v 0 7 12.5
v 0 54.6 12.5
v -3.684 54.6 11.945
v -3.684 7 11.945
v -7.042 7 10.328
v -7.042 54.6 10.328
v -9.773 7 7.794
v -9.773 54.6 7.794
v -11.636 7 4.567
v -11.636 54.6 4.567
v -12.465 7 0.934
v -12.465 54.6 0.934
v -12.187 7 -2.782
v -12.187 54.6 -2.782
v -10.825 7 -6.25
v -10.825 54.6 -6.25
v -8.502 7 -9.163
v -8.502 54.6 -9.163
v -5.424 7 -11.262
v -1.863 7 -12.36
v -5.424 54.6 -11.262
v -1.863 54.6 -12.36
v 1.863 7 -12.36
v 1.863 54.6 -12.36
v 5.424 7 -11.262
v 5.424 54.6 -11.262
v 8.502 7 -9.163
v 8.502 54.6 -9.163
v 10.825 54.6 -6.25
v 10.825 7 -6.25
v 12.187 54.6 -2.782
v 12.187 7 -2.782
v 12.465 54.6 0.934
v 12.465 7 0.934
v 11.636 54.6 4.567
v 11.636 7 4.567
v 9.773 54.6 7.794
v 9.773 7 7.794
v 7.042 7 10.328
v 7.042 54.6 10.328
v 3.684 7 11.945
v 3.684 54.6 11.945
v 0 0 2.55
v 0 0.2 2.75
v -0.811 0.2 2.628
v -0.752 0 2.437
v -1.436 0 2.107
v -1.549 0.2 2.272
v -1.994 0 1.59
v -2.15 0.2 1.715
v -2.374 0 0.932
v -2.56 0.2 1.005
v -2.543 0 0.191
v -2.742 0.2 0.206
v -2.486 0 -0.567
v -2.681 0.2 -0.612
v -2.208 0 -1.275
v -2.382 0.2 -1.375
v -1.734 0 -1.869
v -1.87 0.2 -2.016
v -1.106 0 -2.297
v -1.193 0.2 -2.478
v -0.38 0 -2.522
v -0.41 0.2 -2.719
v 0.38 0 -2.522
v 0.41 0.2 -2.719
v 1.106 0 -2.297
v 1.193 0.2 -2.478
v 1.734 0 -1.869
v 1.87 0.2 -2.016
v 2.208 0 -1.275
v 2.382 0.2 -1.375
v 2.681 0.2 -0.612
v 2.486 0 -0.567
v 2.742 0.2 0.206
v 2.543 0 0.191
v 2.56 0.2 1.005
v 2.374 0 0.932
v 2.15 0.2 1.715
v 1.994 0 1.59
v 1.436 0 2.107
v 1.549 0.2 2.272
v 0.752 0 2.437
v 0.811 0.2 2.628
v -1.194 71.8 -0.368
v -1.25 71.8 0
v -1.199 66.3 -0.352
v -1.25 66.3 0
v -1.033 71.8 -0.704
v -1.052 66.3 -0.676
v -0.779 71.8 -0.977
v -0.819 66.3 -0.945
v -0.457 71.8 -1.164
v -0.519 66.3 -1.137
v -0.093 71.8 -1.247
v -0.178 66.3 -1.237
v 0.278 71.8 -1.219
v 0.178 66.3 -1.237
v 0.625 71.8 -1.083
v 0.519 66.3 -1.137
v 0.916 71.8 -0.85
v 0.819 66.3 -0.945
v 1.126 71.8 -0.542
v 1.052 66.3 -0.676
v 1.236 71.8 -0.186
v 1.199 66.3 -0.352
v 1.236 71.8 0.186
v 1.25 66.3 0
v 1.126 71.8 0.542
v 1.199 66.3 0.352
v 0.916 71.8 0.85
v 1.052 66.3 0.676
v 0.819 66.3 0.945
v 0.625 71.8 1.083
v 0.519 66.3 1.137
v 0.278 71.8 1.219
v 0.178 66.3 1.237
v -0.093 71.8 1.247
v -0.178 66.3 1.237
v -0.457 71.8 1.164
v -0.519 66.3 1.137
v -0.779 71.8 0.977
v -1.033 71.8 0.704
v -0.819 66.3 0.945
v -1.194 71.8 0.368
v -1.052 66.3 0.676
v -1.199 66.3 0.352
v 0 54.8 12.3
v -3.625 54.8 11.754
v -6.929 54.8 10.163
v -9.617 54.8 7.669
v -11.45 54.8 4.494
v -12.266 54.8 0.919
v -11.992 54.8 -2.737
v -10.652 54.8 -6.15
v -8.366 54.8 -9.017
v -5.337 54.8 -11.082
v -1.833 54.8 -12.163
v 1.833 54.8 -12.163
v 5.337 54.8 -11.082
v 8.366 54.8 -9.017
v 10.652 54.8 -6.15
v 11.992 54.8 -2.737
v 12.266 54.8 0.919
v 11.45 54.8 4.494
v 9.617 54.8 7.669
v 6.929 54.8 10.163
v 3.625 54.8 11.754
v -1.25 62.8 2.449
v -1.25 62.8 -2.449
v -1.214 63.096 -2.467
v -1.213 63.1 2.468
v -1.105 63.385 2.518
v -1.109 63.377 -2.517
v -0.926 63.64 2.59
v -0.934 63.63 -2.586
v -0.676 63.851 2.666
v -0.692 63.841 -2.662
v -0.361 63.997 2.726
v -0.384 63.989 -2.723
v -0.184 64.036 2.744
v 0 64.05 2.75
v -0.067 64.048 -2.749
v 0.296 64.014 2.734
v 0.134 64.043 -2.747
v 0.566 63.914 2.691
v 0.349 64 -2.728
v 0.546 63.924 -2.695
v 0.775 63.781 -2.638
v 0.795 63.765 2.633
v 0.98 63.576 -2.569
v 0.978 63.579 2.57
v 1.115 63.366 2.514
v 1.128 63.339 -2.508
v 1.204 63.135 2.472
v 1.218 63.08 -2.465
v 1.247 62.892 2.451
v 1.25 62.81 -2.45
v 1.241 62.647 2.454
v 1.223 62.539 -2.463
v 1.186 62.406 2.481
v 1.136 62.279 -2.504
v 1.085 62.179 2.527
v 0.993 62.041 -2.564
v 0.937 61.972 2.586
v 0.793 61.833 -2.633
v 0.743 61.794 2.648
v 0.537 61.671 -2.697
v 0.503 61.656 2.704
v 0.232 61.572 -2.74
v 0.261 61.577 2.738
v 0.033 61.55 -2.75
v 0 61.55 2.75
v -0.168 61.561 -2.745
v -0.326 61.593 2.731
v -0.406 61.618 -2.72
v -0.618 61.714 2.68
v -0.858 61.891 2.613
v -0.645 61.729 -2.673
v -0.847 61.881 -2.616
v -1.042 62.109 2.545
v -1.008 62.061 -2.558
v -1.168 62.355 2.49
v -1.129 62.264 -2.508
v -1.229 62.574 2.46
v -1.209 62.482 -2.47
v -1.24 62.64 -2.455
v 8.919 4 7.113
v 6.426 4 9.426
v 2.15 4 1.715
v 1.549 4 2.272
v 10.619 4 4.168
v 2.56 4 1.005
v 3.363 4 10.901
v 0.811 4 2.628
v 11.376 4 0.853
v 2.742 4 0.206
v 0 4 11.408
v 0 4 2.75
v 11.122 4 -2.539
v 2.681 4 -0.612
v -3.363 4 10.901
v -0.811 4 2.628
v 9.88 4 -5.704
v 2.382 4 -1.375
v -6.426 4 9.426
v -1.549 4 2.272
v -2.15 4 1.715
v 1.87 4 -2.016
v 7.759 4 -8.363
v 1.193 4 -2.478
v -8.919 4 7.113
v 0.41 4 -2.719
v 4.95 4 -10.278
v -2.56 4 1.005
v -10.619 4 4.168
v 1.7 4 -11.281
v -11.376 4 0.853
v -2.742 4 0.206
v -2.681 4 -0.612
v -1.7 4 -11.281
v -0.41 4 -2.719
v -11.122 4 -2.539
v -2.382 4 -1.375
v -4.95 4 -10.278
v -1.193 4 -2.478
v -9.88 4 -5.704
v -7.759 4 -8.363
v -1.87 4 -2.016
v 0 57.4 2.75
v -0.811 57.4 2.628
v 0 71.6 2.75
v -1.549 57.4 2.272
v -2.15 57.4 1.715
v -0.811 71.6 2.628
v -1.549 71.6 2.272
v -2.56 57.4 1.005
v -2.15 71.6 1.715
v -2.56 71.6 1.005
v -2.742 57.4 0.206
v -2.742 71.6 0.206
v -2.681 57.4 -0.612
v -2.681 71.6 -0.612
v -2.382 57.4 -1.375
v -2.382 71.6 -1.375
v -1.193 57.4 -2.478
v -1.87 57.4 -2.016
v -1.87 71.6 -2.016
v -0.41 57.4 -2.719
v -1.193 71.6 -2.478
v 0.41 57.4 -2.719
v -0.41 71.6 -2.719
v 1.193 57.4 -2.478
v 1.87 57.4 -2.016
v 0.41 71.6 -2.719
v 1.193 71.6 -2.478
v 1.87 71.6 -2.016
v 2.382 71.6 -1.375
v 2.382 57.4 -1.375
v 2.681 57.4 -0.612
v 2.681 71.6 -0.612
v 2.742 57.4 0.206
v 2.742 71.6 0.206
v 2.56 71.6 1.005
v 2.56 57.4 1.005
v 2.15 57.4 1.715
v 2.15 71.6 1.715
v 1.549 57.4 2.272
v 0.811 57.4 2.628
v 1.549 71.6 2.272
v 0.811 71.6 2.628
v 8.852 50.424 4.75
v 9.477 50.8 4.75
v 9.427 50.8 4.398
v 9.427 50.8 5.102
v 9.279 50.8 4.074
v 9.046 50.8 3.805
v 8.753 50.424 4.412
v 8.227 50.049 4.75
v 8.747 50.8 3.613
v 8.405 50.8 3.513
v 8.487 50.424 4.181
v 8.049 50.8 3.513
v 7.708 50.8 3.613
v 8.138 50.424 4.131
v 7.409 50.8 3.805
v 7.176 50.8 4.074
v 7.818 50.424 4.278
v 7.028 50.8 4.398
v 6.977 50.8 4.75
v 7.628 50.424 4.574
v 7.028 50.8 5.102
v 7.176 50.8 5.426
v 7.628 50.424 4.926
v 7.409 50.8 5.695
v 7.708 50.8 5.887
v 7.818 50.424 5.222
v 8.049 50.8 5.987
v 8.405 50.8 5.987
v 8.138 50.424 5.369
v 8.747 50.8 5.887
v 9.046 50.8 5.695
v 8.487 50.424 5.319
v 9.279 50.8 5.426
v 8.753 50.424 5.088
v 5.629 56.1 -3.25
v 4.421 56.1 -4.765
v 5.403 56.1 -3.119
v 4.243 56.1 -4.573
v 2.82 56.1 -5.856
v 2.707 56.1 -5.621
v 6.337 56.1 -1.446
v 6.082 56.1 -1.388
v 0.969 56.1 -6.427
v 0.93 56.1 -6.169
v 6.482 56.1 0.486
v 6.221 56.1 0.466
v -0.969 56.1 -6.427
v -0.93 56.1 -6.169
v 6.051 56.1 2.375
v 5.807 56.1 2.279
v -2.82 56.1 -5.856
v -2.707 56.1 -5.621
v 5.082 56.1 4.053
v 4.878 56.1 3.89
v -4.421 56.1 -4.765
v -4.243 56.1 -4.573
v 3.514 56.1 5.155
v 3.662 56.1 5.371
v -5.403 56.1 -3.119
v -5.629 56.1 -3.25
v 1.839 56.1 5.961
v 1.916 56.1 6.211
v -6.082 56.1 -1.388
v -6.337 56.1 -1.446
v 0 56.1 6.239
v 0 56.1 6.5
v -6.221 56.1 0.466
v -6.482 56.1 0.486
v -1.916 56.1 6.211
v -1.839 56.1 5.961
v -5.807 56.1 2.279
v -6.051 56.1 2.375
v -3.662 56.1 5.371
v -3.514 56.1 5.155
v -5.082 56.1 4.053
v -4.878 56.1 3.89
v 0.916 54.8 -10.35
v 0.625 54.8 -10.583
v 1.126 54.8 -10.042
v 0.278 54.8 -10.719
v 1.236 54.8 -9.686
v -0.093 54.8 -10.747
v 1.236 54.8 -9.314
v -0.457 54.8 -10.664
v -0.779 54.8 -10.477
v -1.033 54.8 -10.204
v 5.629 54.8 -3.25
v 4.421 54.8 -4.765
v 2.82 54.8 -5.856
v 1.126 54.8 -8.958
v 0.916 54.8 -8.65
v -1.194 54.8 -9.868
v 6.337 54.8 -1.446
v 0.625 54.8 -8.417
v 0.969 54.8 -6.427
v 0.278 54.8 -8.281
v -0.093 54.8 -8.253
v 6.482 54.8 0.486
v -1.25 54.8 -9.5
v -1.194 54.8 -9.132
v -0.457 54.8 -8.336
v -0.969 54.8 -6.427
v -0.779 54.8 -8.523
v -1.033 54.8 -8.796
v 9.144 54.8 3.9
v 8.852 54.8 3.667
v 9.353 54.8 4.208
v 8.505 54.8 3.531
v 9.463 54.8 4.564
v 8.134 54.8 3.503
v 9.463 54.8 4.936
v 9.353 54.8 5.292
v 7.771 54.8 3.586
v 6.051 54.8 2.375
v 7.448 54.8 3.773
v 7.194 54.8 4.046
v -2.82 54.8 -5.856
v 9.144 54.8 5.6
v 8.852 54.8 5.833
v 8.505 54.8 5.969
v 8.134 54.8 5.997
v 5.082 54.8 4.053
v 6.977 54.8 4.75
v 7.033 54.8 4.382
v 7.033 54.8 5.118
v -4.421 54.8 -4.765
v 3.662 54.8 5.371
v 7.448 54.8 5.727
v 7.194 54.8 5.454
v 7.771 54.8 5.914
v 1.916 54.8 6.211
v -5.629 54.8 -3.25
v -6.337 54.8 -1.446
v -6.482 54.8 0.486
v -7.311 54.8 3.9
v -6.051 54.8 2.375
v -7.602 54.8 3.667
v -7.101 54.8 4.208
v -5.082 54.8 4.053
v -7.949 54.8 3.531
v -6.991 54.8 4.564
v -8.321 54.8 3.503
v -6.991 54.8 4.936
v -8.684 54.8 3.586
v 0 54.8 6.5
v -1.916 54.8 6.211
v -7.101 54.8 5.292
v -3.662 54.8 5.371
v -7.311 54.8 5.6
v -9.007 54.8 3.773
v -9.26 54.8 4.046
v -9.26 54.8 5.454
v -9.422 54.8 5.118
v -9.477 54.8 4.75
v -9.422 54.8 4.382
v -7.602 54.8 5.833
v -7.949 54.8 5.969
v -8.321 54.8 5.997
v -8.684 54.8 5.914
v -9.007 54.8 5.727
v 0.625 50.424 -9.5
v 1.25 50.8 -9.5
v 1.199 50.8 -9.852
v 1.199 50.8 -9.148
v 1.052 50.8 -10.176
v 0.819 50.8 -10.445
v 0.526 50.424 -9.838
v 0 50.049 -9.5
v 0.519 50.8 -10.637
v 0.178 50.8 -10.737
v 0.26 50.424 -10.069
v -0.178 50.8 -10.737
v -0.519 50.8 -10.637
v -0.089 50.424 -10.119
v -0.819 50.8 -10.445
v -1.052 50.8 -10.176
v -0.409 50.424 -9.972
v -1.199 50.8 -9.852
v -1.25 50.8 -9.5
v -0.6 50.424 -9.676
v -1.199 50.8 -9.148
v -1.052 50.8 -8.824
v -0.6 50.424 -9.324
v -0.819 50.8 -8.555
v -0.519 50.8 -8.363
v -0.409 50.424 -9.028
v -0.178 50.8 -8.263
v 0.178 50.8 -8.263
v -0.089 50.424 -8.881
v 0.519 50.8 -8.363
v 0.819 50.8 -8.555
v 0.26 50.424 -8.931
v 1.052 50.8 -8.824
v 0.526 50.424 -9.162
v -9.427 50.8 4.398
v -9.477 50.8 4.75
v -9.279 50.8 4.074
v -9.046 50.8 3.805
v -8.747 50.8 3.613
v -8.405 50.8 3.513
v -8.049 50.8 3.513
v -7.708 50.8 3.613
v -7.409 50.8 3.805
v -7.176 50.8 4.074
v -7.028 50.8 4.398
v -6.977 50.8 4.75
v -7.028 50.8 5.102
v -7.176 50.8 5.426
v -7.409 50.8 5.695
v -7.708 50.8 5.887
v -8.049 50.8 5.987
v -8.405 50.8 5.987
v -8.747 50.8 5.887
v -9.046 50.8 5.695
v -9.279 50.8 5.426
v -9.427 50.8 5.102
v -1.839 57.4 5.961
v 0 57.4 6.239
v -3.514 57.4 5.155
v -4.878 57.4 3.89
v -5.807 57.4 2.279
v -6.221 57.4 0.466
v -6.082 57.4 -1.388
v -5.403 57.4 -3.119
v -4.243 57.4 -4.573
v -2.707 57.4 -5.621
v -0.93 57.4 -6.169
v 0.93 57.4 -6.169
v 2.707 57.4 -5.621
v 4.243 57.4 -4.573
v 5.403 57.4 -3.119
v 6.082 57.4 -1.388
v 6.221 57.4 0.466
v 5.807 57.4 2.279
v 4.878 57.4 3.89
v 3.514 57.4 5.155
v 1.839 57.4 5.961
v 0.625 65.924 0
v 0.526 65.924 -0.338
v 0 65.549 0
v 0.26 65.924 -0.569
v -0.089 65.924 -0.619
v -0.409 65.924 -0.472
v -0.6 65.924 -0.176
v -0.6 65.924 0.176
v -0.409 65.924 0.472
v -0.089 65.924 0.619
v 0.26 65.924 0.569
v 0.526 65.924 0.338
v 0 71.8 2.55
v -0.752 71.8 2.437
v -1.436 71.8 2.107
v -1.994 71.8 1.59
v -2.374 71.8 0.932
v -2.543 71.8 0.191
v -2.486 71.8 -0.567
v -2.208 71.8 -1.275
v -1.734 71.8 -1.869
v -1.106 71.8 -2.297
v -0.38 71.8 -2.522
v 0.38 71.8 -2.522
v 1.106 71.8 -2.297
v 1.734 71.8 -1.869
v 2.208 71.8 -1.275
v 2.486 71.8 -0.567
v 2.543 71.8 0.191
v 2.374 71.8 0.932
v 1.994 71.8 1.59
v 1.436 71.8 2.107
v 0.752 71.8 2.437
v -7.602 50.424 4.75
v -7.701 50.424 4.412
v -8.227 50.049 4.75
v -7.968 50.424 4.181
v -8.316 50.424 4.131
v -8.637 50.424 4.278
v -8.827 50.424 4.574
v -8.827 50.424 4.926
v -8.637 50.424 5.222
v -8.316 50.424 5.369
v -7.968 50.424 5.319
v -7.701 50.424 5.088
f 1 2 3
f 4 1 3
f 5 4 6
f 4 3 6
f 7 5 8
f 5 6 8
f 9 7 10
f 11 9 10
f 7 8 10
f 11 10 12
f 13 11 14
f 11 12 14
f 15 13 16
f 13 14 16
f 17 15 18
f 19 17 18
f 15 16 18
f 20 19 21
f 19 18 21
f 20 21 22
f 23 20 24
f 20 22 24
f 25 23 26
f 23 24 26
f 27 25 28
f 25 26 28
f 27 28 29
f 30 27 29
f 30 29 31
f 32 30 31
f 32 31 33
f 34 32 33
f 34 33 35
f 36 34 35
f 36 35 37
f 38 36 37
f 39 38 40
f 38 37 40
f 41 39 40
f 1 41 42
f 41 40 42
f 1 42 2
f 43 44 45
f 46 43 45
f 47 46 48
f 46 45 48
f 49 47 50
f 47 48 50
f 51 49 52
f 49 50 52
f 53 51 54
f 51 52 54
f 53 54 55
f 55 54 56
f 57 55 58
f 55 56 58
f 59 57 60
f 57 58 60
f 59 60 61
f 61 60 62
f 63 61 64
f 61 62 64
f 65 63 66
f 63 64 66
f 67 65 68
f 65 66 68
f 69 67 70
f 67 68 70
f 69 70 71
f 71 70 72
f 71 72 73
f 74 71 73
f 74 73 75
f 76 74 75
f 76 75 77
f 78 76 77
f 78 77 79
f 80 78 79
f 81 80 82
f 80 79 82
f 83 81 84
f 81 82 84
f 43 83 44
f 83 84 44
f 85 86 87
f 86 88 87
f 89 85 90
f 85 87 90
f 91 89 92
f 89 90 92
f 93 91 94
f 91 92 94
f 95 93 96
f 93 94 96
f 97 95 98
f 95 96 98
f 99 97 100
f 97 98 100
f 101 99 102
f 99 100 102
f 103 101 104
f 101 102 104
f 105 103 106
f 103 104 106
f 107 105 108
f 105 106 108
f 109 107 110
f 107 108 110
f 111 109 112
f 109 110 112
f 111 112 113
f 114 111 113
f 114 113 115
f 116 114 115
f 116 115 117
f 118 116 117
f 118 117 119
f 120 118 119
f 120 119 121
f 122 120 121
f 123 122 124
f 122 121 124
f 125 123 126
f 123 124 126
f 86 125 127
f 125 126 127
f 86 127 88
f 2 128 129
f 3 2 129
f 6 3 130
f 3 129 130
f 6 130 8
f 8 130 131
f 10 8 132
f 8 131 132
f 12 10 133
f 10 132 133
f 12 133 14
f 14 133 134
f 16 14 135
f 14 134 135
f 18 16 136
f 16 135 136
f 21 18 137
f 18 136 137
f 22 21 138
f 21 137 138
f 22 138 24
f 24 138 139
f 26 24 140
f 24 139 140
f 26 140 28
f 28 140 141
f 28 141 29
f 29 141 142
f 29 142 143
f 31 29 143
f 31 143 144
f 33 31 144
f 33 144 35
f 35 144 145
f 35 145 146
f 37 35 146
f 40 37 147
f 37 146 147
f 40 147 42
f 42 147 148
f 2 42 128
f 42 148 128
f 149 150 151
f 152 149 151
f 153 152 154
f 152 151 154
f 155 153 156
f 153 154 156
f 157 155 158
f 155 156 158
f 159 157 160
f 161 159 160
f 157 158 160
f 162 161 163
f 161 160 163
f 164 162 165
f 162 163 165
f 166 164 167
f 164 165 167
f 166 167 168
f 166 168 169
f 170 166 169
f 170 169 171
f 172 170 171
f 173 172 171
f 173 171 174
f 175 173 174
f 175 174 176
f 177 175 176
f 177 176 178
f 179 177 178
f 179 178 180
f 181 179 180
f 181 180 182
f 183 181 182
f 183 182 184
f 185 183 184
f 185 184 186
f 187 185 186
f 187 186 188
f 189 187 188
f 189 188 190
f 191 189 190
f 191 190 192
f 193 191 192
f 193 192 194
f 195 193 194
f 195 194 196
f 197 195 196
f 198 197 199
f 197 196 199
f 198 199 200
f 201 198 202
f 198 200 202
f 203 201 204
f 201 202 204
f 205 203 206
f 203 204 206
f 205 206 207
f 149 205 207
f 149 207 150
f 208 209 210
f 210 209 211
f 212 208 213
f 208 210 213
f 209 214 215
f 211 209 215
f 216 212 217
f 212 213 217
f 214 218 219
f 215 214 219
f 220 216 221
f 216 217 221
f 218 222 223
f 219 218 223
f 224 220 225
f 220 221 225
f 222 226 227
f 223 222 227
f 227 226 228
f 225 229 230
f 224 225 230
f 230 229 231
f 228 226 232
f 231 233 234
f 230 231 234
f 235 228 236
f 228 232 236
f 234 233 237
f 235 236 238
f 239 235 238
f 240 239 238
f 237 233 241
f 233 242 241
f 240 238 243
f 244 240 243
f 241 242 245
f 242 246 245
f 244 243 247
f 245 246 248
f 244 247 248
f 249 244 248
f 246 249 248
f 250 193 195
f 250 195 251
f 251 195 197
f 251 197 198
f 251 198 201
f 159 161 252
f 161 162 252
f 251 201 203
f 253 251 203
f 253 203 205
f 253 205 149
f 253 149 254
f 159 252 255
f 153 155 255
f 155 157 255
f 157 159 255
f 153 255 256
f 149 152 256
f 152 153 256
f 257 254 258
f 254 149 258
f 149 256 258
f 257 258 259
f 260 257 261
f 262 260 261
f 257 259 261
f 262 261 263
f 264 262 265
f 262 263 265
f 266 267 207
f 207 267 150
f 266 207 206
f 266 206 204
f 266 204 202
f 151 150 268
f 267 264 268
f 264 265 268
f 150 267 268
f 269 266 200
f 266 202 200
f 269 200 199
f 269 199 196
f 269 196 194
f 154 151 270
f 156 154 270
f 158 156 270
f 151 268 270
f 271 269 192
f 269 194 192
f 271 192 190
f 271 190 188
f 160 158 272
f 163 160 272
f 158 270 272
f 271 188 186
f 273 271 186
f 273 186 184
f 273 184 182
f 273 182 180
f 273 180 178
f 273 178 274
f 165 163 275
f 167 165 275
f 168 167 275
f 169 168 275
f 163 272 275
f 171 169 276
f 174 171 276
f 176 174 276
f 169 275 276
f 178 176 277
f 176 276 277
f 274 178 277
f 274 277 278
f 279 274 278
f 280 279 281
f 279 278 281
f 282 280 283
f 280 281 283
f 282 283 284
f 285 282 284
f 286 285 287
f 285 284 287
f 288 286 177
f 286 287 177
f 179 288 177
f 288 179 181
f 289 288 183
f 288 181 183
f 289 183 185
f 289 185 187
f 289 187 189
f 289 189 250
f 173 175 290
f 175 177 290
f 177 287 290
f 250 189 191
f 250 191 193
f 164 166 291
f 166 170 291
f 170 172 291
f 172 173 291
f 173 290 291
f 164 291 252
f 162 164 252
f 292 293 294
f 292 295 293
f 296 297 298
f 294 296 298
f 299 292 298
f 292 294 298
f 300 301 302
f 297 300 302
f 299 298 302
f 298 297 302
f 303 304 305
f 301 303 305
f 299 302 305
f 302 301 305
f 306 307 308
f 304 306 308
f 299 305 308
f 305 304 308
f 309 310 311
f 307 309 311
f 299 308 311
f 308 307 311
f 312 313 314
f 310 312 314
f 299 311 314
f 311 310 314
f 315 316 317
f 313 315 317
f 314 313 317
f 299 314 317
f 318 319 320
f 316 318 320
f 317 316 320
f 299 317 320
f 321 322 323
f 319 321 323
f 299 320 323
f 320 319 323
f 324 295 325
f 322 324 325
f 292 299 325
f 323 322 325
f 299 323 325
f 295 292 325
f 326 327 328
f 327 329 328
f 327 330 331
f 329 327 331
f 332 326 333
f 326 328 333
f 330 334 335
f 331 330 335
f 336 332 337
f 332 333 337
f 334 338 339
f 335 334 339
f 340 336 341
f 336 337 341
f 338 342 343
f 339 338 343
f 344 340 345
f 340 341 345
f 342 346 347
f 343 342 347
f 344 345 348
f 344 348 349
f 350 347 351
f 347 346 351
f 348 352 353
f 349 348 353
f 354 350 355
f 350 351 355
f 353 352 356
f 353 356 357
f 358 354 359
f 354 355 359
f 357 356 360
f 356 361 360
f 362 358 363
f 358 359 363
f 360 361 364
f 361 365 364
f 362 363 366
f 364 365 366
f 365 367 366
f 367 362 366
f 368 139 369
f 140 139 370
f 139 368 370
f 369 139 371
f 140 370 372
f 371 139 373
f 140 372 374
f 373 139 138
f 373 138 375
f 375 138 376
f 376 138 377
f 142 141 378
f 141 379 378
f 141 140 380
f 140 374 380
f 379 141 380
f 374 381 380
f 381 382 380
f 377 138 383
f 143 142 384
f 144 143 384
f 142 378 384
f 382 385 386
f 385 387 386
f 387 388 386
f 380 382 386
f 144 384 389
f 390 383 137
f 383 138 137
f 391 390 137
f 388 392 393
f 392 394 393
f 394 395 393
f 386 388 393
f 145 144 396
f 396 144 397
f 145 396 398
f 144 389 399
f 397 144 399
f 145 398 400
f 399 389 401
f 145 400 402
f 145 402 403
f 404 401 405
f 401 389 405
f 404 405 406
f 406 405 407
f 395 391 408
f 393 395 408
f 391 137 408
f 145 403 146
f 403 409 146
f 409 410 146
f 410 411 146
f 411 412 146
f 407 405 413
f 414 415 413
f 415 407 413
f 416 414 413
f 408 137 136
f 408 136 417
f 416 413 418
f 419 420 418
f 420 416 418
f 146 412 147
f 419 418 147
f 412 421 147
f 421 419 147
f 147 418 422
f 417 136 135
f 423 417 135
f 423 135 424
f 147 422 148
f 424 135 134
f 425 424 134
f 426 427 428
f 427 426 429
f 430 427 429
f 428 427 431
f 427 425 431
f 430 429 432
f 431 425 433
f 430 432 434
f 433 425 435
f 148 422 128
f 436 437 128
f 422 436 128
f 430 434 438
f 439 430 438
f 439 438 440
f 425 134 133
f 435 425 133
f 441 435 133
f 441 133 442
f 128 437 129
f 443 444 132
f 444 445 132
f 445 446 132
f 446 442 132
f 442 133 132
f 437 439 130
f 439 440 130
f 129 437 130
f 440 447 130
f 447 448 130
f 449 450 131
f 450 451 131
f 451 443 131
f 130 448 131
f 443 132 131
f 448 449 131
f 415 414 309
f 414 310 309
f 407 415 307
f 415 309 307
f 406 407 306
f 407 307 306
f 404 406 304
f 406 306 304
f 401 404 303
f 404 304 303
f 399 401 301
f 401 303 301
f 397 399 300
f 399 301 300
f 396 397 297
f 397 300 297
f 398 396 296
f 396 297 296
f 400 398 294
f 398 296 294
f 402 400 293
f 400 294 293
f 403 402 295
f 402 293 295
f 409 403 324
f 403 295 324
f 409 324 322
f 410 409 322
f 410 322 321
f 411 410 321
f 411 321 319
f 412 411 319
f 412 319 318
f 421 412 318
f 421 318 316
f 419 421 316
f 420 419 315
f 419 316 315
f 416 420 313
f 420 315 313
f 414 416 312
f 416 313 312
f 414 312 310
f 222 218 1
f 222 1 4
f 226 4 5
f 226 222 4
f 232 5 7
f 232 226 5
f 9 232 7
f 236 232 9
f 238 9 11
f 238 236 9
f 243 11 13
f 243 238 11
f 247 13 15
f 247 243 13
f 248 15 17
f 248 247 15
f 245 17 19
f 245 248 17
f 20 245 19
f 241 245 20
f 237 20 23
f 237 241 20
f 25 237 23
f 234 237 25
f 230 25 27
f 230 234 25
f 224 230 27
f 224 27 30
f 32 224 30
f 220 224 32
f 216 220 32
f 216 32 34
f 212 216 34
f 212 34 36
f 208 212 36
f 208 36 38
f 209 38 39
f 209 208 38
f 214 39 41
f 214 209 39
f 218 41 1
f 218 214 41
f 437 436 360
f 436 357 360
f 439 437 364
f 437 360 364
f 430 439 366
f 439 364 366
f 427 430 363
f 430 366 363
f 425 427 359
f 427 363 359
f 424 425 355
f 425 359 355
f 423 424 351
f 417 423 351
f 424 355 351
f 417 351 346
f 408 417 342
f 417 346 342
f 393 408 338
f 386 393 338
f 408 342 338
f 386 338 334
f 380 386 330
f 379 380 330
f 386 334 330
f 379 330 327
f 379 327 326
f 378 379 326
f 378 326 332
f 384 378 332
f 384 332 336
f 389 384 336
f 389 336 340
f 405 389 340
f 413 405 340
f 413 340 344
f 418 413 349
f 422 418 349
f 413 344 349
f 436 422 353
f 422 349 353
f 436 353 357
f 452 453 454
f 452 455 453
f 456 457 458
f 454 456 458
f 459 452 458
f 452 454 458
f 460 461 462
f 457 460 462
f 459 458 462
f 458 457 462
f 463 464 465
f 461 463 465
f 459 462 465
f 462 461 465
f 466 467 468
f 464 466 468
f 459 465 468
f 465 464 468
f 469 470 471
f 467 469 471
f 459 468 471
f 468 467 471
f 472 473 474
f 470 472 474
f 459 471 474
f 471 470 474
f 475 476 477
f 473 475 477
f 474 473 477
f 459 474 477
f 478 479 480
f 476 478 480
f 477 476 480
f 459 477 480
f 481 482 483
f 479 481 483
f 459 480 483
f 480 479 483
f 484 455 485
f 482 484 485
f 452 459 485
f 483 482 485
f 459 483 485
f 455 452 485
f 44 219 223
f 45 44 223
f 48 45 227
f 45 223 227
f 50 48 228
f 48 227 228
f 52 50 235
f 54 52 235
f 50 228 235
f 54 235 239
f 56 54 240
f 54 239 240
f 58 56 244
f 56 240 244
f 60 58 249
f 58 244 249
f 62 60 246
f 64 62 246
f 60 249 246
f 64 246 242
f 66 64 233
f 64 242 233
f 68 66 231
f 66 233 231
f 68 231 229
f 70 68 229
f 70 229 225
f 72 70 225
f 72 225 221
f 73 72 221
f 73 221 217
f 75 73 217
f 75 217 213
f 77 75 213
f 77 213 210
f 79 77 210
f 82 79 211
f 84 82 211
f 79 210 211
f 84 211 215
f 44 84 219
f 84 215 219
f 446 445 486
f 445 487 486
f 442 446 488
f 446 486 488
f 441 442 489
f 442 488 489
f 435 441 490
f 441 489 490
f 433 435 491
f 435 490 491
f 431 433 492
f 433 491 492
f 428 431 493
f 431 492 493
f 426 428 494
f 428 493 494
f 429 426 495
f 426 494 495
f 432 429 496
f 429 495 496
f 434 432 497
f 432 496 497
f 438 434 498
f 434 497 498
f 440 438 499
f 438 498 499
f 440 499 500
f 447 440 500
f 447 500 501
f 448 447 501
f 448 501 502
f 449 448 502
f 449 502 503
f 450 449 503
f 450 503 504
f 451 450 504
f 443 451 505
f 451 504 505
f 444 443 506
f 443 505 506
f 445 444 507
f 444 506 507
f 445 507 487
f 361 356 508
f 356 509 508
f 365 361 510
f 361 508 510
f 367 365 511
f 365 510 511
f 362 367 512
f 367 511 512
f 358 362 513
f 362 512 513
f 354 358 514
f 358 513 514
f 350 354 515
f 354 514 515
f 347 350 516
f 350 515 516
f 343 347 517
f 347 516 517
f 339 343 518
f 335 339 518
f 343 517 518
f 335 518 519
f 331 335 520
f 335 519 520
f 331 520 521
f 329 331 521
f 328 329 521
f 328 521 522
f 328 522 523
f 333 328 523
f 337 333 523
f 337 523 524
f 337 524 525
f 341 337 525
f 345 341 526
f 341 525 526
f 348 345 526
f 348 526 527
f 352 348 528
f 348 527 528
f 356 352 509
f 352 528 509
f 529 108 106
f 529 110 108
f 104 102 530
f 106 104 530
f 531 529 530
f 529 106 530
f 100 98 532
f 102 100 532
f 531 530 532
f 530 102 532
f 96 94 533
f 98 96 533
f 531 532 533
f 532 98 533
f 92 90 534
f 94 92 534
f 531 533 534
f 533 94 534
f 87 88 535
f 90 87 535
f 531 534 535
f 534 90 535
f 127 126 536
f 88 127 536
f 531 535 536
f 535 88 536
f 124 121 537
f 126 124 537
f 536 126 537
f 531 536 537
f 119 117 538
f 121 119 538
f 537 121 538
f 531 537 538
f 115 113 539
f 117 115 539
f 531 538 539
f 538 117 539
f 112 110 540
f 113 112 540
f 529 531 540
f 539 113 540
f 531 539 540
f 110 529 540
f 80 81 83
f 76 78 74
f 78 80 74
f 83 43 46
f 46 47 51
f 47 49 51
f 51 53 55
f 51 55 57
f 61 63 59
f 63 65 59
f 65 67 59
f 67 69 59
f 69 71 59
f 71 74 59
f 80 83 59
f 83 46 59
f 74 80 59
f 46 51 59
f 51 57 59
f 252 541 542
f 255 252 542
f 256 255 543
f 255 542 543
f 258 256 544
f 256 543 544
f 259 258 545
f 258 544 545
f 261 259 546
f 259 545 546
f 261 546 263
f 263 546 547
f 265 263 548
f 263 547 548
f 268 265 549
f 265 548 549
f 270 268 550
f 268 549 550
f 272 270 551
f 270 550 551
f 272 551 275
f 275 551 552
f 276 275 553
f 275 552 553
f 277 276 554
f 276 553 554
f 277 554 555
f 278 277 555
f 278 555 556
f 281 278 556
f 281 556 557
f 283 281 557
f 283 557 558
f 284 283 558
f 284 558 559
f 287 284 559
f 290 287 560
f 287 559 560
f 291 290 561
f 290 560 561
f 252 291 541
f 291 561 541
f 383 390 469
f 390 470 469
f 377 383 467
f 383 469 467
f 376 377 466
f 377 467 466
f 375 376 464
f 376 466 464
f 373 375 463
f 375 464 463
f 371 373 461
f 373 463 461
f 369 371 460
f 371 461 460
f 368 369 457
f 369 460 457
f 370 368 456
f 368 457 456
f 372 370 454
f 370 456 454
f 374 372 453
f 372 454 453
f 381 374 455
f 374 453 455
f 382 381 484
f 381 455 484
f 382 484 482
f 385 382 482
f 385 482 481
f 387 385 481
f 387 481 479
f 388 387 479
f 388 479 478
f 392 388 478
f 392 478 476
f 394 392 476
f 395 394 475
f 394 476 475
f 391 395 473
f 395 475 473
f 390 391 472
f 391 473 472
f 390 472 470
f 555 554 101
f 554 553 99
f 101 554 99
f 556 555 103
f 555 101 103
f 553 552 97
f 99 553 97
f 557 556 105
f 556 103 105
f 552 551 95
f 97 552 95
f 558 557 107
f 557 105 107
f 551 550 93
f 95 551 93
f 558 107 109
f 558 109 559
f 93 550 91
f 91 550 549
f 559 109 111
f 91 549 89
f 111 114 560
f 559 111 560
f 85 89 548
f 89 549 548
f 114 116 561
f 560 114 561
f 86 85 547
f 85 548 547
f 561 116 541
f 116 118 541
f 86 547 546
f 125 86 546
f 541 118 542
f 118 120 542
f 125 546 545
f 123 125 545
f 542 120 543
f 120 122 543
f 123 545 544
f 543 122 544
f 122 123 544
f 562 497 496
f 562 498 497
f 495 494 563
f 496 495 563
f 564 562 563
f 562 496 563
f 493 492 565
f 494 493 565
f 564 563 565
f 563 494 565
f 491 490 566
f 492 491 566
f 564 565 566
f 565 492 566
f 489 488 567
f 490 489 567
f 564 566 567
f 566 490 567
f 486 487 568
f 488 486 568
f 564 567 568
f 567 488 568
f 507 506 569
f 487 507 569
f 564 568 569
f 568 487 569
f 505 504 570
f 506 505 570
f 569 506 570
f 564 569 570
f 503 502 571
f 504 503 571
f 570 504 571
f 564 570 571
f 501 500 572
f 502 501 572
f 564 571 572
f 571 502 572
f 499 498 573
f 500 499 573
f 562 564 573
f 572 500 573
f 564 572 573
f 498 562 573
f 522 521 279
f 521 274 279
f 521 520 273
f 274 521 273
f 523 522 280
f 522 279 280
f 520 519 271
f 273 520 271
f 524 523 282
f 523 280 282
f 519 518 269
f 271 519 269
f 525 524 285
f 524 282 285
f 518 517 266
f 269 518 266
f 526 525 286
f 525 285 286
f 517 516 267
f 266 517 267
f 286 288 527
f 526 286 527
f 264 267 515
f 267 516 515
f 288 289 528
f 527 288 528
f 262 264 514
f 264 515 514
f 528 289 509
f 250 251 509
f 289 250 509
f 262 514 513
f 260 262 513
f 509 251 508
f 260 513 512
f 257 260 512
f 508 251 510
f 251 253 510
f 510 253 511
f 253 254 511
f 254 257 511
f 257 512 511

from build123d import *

# Parameters (mm, degrees)
CHAMFER_1_SIZE         = 0.2
CHAMFER_2_SIZE         = 3
CHAMFER_2_SIZE2        = 1.091910703
HOLE_WIZARD_M3_1_D     = 2.5
HOLE_WIZARD_M3_1_DEPTH = 5.5
HOLE_WIZARD_M3_1_TIP   = 0.751075774
HOLE_WIZARD_M3_2_D     = 2.5
HOLE_WIZARD_M3_2_DEPTH = 7.5
HOLE_WIZARD_M3_2_TIP   = 0.751075774
HOLE_WIZARD_M3_3_D     = 2.5
HOLE_WIZARD_M3_3_DEPTH = 4
HOLE_WIZARD_M3_3_TIP   = 0.751075774


with BuildPart() as part:
    # 草图1 → 旋转1 (revolve)
    with BuildSketch(Plane(origin=(0, 0, 0), x_dir=(0, 0, -1), z_dir=(1, 0, 0)), mode=Mode.PRIVATE) as revolve_1_sk:
        Polygon((0, 0), (2.75, 0), (2.75, 4), (12.5, 4), (12.5, 54.8), (6.5, 54.8), (6.5, 56.1), (6.238591707, 56.1), (6.238591707, 57.4), (2.75, 57.4), (2.75, 71.8), (0, 71.8), align=None)
    revolve(revolve_1_sk.sketch.rotate(Axis((0, 90.041930378, 0), (0, -1, 0)), 180), axis=Axis((0, 90.041930378, 0), (0, -1, 0)))

    # 倒角1
    chamfer_1_edges = [part.edges().sort_by_distance(p)[0] for p in [
        (0, 54.8, -12.5),
        (0, 0, -2.75),
        (0, 71.8, -2.75),
    ]]
    chamfer(chamfer_1_edges, length=CHAMFER_1_SIZE)

    # 倒角2
    chamfer_2_edges = [part.edges().sort_by_distance(p)[0] for p in [
        (0, 4, -12.5),
    ]]
    chamfer_2_side = [part.faces().sort_by_distance(p)[0] for p in [
        (0, 29.3, -12.5),
    ]]
    chamfer(chamfer_2_edges, length=CHAMFER_2_SIZE, length2=CHAMFER_2_SIZE2, reference=chamfer_2_side[0])

    # M3 螺纹孔1
    with Locations(Plane(origin=(0, 71.8, 0), x_dir=(1, 0, 0), z_dir=(0, 1, 0))):
        with Locations((0, 0)):
            Hole(HOLE_WIZARD_M3_1_D / 2, depth=HOLE_WIZARD_M3_1_DEPTH)
            with Locations((0, 0, -(HOLE_WIZARD_M3_1_DEPTH + HOLE_WIZARD_M3_1_TIP / 2))):  # 118° drill point
                Cone(0, HOLE_WIZARD_M3_1_D / 2, HOLE_WIZARD_M3_1_TIP, mode=Mode.SUBTRACT)

    # M3 螺纹孔2
    with Locations(Plane.XY.offset(2.75)):
        with Locations((0, 62.8)):
            Hole(HOLE_WIZARD_M3_2_D / 2, depth=HOLE_WIZARD_M3_2_DEPTH)
            with Locations((0, 0, -(HOLE_WIZARD_M3_2_DEPTH + HOLE_WIZARD_M3_2_TIP / 2))):  # 118° drill point
                Cone(0, HOLE_WIZARD_M3_2_D / 2, HOLE_WIZARD_M3_2_TIP, mode=Mode.SUBTRACT)

    # M3 螺纹孔3
    with Locations(Plane(origin=(0, 54.8, 0), x_dir=(1, 0, 0), z_dir=(0, 1, 0))):
        with Locations((0, 9.5), (-8.227241336, -4.75), (8.227241336, -4.75)):
            Hole(HOLE_WIZARD_M3_3_D / 2, depth=HOLE_WIZARD_M3_3_DEPTH)
            with Locations((0, 0, -(HOLE_WIZARD_M3_3_DEPTH + HOLE_WIZARD_M3_3_TIP / 2))):  # 118° drill point
                Cone(0, HOLE_WIZARD_M3_3_D / 2, HOLE_WIZARD_M3_3_TIP, mode=Mode.SUBTRACT)


solid = part.part
